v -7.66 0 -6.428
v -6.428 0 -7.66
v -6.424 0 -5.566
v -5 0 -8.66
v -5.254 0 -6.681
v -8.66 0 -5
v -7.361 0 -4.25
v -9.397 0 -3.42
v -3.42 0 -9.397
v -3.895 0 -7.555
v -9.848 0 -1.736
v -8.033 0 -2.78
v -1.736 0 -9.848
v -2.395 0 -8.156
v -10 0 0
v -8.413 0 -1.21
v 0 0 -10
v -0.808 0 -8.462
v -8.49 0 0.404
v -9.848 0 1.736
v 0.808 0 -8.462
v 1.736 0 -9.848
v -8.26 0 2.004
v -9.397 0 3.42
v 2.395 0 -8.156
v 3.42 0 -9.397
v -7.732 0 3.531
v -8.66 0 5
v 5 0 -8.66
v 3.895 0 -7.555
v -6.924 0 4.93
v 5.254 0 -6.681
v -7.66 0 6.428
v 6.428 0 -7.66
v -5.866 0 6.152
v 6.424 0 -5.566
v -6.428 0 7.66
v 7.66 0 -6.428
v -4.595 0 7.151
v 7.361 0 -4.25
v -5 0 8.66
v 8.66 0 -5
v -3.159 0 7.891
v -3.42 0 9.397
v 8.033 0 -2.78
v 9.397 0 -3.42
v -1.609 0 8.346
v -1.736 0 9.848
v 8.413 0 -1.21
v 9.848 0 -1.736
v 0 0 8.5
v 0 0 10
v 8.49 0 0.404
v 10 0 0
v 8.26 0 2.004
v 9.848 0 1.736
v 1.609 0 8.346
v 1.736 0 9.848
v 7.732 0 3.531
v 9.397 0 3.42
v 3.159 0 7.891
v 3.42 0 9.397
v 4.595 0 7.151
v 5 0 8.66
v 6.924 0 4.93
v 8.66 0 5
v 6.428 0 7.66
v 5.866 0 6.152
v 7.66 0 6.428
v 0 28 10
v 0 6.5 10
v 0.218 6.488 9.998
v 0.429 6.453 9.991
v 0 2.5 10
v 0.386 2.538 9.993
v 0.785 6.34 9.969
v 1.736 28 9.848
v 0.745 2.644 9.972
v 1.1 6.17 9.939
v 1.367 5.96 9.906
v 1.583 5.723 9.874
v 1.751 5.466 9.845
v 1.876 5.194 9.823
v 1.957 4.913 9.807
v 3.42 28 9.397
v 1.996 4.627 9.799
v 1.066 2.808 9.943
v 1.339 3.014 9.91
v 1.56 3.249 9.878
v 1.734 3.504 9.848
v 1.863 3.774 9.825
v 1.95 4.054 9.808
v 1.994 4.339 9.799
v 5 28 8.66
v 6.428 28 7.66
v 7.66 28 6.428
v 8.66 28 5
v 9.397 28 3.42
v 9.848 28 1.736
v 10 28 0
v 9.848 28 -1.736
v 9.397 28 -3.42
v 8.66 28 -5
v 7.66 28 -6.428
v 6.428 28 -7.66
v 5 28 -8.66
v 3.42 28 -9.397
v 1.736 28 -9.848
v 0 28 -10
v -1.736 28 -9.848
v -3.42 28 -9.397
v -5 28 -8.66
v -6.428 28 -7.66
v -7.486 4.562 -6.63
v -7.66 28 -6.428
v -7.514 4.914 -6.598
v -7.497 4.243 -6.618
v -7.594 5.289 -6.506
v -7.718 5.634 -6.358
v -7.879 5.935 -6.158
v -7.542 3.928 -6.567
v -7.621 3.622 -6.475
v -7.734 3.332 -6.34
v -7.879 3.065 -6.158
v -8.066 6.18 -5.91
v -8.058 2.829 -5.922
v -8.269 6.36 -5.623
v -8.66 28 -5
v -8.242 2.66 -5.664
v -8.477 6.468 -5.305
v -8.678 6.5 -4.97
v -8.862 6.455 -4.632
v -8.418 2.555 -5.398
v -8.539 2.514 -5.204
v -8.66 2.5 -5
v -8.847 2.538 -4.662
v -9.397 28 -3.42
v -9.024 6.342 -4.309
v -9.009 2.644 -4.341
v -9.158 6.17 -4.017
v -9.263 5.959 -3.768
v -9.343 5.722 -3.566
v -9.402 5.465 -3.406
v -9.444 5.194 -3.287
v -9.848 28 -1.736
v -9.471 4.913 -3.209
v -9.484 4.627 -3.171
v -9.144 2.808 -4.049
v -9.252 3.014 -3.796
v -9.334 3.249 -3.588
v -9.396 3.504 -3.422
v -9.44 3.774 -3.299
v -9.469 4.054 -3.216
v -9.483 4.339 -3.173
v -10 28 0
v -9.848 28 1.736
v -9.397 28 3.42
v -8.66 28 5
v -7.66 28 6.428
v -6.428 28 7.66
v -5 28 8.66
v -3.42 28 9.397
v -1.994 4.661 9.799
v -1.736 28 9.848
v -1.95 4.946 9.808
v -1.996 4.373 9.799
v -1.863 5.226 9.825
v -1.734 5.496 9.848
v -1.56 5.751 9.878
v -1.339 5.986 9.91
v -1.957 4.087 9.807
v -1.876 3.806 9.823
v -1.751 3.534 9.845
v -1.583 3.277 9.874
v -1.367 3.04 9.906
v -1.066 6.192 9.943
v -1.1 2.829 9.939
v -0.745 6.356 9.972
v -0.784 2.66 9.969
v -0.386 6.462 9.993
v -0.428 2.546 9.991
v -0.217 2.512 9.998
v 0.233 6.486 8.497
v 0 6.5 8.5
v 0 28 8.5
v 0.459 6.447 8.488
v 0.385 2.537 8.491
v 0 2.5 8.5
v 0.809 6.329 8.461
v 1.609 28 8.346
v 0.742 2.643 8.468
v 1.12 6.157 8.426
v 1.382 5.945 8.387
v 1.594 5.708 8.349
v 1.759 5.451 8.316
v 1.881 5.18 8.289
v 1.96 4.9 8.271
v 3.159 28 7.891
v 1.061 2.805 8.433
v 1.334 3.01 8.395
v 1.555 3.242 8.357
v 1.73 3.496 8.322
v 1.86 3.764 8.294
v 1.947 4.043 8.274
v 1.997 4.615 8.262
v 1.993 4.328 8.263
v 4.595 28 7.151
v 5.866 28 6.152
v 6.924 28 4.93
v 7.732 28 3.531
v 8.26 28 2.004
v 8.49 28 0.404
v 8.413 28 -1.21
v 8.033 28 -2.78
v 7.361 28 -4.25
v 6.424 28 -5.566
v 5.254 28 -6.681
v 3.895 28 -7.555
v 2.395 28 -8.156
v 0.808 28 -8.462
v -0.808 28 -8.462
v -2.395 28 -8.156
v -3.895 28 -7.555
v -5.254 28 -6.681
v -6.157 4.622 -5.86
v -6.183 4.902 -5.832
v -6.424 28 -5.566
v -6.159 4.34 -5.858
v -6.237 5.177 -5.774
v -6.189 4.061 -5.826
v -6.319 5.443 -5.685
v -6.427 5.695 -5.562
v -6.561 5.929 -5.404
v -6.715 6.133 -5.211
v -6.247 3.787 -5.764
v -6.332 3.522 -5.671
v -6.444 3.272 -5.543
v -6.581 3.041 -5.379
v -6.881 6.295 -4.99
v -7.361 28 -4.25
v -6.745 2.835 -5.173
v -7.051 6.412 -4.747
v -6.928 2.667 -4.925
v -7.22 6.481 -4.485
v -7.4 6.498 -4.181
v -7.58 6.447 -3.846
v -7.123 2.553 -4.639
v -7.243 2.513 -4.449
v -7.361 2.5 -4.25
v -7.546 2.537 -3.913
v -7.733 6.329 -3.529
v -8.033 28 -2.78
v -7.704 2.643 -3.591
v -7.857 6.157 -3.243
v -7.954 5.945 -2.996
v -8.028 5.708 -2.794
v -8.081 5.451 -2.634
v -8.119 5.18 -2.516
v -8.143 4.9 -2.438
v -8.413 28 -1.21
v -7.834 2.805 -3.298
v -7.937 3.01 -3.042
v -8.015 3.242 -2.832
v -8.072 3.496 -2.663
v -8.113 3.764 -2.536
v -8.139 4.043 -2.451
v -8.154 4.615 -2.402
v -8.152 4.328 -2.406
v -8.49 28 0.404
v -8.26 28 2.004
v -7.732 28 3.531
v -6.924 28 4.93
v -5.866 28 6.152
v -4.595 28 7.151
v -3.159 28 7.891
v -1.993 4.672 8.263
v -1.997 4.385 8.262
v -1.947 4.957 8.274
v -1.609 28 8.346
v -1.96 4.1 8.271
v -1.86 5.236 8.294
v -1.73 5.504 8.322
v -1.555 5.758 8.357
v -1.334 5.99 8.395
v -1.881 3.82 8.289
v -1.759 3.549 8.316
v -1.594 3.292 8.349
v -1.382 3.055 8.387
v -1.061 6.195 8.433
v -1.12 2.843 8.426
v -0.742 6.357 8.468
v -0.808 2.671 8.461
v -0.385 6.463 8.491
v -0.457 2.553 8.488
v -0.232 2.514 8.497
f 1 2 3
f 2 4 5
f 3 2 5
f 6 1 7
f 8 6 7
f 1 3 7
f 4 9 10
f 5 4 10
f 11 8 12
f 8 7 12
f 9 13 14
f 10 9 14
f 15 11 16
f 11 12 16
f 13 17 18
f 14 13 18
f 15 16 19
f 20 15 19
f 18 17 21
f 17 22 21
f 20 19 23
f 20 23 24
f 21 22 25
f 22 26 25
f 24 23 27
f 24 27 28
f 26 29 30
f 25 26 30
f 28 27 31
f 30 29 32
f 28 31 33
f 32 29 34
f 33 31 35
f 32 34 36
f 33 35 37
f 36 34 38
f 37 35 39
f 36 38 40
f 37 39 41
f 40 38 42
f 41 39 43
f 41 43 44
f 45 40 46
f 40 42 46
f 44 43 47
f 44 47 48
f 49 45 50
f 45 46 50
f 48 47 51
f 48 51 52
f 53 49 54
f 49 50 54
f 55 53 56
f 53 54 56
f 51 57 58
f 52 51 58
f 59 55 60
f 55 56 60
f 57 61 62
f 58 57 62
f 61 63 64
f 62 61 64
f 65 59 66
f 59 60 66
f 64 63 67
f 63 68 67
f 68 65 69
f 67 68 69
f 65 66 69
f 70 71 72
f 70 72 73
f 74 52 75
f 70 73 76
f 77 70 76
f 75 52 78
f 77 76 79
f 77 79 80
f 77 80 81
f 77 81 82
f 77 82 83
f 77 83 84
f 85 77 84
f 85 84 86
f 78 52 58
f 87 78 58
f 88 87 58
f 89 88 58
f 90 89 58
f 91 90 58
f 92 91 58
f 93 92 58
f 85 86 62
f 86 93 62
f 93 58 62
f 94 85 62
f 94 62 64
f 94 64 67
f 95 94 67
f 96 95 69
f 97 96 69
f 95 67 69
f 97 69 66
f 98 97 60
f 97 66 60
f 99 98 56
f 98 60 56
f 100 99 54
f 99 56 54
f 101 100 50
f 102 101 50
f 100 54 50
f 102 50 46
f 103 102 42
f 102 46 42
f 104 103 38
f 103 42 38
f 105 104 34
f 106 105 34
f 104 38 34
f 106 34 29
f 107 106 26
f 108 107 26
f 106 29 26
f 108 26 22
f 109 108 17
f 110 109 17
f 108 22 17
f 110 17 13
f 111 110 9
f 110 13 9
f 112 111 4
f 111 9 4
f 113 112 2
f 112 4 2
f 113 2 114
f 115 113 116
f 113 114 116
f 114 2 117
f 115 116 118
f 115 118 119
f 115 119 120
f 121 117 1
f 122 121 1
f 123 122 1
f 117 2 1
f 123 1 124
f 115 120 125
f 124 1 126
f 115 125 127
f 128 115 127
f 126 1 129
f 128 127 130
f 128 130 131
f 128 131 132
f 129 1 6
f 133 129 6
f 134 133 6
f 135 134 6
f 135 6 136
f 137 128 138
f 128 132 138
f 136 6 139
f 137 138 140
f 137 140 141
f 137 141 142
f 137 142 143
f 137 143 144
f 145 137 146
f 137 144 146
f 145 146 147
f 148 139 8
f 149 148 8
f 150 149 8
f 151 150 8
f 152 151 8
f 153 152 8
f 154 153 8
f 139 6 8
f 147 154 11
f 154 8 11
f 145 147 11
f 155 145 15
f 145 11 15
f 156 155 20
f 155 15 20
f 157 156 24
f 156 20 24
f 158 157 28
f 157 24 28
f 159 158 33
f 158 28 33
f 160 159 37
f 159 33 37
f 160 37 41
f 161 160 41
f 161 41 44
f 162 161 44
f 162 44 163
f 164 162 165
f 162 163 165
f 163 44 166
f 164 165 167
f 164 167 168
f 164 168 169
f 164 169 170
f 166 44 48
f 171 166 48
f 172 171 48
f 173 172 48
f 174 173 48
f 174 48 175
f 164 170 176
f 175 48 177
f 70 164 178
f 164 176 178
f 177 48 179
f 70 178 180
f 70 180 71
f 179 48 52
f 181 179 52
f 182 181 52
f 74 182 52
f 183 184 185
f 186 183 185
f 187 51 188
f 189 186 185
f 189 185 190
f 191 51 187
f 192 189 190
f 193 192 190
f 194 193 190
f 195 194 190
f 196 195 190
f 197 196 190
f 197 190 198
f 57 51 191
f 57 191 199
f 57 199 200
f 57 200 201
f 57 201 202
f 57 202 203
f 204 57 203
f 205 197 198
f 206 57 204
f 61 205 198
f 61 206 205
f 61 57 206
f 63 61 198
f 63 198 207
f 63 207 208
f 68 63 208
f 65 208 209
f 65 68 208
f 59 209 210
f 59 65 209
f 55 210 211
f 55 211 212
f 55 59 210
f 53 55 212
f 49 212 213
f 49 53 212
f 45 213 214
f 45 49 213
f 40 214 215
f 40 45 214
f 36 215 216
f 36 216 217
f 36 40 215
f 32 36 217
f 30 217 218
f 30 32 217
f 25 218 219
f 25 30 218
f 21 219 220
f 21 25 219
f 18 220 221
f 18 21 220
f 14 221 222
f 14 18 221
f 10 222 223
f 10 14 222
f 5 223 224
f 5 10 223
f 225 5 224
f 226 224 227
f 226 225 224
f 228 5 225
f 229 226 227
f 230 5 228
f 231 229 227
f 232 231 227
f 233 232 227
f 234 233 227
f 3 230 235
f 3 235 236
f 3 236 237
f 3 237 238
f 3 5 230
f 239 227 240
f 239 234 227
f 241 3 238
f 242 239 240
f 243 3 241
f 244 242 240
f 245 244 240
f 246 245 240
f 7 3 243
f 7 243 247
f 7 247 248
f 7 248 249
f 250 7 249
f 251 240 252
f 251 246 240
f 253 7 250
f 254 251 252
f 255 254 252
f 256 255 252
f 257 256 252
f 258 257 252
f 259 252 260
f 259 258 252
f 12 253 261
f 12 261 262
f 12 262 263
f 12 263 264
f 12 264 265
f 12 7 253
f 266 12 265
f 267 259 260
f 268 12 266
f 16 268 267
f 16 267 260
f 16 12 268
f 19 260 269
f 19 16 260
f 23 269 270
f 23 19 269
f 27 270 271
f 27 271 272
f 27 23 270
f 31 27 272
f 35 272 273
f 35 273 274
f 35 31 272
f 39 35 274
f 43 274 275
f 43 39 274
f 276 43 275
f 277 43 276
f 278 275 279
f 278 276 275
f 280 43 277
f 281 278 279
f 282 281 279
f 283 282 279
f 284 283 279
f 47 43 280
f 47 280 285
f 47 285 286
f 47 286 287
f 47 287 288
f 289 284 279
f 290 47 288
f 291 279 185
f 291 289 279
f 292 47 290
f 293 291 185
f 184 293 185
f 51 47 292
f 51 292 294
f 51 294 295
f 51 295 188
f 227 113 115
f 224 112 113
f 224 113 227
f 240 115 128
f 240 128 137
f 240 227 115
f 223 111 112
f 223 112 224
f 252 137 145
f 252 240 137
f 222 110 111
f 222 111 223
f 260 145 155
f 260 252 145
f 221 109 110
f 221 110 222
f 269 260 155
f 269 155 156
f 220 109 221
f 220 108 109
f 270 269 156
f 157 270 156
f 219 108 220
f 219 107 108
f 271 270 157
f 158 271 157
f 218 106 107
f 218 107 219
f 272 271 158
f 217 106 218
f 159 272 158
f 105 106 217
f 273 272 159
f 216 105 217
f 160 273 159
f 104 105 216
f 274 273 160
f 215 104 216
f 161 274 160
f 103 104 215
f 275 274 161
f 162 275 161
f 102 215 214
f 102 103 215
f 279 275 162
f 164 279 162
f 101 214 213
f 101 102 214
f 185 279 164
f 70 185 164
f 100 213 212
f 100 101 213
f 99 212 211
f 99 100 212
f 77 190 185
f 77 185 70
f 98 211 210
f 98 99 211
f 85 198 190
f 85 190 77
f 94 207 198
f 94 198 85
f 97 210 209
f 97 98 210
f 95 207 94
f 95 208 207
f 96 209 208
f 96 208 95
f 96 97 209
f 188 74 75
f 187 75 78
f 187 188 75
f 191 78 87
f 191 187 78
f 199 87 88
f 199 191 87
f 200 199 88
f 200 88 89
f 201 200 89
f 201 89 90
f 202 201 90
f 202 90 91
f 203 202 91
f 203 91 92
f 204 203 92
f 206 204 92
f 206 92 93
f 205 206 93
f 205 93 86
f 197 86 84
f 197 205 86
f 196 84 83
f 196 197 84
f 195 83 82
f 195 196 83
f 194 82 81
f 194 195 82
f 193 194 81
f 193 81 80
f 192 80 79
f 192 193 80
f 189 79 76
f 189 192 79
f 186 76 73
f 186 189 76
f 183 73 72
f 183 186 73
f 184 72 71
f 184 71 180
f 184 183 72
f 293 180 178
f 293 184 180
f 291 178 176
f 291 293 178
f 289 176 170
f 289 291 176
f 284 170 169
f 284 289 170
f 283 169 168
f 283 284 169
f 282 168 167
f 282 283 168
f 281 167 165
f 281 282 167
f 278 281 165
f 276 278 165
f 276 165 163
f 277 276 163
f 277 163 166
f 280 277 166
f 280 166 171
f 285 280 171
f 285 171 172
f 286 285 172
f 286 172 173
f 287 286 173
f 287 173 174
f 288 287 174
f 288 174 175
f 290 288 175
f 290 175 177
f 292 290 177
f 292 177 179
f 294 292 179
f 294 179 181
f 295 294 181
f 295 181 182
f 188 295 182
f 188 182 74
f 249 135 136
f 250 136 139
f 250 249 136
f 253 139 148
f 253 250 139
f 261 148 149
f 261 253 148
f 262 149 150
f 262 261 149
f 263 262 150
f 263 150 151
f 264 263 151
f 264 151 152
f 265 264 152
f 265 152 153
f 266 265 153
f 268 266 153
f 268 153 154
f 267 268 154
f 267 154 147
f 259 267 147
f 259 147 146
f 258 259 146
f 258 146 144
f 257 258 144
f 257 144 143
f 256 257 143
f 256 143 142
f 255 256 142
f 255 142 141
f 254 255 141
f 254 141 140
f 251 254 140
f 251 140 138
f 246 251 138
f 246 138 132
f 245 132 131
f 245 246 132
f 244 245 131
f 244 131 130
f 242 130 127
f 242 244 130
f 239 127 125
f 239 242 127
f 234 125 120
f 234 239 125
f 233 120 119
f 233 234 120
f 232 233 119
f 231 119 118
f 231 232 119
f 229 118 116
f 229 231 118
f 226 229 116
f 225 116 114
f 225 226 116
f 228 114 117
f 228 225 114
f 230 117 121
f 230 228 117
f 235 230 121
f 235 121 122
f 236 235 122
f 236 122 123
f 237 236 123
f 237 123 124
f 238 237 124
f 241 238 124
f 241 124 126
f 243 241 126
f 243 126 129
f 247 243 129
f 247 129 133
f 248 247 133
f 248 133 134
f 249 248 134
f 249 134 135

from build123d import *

# Parameters (mm, degrees)
SKETCH_1_R               = 10
SKETCH_1_R_2             = 8.5
EXTRUDE_325_DEPTH        = 28
SKETCH_2_R               = 2
CUT_EXTRUDE_1_DEPTH      = 32.368774283
PATTERN_CIRCULAR_1_COUNT = 2
PATTERN_CIRCULAR_1_ANGLE = 120


with BuildPart() as part:
    # Эскиз1 → Extrude 325 (new body)
    with BuildSketch(Plane(origin=(0, 0, 0), x_dir=(1, 0, 0), z_dir=(0, 1, 0))):
        with Locations(Location((0, 0, 0), (0, 0, 270))):
            Circle(SKETCH_1_R)
        with Locations(Location((0, 0, 0), (0, 0, 270))):
            Circle(SKETCH_1_R_2, mode=Mode.SUBTRACT)
    extrude(amount=EXTRUDE_325_DEPTH)

    # Эскиз2 → отверстие чтоб прикрутиться 1 (cut, through all)
    with BuildSketch(Plane.XY):
        with Locations(Location((0, 4.5, 0), (0, 0, 269.999999945))):
            Circle(SKETCH_2_R)
    cut_extrude_1 = extrude(amount=CUT_EXTRUDE_1_DEPTH, mode=Mode.SUBTRACT)

    # Круговой массив1: отверстие чтоб прикрутиться 1 ×2 about axis
    pattern_circular_1_axis = Axis((0, 28, 0), (0, -1, 0))
    for i in range(1, PATTERN_CIRCULAR_1_COUNT):
        add(cut_extrude_1.rotate(pattern_circular_1_axis, i * PATTERN_CIRCULAR_1_ANGLE / (PATTERN_CIRCULAR_1_COUNT - 1)), mode=Mode.SUBTRACT)


solid = part.part
